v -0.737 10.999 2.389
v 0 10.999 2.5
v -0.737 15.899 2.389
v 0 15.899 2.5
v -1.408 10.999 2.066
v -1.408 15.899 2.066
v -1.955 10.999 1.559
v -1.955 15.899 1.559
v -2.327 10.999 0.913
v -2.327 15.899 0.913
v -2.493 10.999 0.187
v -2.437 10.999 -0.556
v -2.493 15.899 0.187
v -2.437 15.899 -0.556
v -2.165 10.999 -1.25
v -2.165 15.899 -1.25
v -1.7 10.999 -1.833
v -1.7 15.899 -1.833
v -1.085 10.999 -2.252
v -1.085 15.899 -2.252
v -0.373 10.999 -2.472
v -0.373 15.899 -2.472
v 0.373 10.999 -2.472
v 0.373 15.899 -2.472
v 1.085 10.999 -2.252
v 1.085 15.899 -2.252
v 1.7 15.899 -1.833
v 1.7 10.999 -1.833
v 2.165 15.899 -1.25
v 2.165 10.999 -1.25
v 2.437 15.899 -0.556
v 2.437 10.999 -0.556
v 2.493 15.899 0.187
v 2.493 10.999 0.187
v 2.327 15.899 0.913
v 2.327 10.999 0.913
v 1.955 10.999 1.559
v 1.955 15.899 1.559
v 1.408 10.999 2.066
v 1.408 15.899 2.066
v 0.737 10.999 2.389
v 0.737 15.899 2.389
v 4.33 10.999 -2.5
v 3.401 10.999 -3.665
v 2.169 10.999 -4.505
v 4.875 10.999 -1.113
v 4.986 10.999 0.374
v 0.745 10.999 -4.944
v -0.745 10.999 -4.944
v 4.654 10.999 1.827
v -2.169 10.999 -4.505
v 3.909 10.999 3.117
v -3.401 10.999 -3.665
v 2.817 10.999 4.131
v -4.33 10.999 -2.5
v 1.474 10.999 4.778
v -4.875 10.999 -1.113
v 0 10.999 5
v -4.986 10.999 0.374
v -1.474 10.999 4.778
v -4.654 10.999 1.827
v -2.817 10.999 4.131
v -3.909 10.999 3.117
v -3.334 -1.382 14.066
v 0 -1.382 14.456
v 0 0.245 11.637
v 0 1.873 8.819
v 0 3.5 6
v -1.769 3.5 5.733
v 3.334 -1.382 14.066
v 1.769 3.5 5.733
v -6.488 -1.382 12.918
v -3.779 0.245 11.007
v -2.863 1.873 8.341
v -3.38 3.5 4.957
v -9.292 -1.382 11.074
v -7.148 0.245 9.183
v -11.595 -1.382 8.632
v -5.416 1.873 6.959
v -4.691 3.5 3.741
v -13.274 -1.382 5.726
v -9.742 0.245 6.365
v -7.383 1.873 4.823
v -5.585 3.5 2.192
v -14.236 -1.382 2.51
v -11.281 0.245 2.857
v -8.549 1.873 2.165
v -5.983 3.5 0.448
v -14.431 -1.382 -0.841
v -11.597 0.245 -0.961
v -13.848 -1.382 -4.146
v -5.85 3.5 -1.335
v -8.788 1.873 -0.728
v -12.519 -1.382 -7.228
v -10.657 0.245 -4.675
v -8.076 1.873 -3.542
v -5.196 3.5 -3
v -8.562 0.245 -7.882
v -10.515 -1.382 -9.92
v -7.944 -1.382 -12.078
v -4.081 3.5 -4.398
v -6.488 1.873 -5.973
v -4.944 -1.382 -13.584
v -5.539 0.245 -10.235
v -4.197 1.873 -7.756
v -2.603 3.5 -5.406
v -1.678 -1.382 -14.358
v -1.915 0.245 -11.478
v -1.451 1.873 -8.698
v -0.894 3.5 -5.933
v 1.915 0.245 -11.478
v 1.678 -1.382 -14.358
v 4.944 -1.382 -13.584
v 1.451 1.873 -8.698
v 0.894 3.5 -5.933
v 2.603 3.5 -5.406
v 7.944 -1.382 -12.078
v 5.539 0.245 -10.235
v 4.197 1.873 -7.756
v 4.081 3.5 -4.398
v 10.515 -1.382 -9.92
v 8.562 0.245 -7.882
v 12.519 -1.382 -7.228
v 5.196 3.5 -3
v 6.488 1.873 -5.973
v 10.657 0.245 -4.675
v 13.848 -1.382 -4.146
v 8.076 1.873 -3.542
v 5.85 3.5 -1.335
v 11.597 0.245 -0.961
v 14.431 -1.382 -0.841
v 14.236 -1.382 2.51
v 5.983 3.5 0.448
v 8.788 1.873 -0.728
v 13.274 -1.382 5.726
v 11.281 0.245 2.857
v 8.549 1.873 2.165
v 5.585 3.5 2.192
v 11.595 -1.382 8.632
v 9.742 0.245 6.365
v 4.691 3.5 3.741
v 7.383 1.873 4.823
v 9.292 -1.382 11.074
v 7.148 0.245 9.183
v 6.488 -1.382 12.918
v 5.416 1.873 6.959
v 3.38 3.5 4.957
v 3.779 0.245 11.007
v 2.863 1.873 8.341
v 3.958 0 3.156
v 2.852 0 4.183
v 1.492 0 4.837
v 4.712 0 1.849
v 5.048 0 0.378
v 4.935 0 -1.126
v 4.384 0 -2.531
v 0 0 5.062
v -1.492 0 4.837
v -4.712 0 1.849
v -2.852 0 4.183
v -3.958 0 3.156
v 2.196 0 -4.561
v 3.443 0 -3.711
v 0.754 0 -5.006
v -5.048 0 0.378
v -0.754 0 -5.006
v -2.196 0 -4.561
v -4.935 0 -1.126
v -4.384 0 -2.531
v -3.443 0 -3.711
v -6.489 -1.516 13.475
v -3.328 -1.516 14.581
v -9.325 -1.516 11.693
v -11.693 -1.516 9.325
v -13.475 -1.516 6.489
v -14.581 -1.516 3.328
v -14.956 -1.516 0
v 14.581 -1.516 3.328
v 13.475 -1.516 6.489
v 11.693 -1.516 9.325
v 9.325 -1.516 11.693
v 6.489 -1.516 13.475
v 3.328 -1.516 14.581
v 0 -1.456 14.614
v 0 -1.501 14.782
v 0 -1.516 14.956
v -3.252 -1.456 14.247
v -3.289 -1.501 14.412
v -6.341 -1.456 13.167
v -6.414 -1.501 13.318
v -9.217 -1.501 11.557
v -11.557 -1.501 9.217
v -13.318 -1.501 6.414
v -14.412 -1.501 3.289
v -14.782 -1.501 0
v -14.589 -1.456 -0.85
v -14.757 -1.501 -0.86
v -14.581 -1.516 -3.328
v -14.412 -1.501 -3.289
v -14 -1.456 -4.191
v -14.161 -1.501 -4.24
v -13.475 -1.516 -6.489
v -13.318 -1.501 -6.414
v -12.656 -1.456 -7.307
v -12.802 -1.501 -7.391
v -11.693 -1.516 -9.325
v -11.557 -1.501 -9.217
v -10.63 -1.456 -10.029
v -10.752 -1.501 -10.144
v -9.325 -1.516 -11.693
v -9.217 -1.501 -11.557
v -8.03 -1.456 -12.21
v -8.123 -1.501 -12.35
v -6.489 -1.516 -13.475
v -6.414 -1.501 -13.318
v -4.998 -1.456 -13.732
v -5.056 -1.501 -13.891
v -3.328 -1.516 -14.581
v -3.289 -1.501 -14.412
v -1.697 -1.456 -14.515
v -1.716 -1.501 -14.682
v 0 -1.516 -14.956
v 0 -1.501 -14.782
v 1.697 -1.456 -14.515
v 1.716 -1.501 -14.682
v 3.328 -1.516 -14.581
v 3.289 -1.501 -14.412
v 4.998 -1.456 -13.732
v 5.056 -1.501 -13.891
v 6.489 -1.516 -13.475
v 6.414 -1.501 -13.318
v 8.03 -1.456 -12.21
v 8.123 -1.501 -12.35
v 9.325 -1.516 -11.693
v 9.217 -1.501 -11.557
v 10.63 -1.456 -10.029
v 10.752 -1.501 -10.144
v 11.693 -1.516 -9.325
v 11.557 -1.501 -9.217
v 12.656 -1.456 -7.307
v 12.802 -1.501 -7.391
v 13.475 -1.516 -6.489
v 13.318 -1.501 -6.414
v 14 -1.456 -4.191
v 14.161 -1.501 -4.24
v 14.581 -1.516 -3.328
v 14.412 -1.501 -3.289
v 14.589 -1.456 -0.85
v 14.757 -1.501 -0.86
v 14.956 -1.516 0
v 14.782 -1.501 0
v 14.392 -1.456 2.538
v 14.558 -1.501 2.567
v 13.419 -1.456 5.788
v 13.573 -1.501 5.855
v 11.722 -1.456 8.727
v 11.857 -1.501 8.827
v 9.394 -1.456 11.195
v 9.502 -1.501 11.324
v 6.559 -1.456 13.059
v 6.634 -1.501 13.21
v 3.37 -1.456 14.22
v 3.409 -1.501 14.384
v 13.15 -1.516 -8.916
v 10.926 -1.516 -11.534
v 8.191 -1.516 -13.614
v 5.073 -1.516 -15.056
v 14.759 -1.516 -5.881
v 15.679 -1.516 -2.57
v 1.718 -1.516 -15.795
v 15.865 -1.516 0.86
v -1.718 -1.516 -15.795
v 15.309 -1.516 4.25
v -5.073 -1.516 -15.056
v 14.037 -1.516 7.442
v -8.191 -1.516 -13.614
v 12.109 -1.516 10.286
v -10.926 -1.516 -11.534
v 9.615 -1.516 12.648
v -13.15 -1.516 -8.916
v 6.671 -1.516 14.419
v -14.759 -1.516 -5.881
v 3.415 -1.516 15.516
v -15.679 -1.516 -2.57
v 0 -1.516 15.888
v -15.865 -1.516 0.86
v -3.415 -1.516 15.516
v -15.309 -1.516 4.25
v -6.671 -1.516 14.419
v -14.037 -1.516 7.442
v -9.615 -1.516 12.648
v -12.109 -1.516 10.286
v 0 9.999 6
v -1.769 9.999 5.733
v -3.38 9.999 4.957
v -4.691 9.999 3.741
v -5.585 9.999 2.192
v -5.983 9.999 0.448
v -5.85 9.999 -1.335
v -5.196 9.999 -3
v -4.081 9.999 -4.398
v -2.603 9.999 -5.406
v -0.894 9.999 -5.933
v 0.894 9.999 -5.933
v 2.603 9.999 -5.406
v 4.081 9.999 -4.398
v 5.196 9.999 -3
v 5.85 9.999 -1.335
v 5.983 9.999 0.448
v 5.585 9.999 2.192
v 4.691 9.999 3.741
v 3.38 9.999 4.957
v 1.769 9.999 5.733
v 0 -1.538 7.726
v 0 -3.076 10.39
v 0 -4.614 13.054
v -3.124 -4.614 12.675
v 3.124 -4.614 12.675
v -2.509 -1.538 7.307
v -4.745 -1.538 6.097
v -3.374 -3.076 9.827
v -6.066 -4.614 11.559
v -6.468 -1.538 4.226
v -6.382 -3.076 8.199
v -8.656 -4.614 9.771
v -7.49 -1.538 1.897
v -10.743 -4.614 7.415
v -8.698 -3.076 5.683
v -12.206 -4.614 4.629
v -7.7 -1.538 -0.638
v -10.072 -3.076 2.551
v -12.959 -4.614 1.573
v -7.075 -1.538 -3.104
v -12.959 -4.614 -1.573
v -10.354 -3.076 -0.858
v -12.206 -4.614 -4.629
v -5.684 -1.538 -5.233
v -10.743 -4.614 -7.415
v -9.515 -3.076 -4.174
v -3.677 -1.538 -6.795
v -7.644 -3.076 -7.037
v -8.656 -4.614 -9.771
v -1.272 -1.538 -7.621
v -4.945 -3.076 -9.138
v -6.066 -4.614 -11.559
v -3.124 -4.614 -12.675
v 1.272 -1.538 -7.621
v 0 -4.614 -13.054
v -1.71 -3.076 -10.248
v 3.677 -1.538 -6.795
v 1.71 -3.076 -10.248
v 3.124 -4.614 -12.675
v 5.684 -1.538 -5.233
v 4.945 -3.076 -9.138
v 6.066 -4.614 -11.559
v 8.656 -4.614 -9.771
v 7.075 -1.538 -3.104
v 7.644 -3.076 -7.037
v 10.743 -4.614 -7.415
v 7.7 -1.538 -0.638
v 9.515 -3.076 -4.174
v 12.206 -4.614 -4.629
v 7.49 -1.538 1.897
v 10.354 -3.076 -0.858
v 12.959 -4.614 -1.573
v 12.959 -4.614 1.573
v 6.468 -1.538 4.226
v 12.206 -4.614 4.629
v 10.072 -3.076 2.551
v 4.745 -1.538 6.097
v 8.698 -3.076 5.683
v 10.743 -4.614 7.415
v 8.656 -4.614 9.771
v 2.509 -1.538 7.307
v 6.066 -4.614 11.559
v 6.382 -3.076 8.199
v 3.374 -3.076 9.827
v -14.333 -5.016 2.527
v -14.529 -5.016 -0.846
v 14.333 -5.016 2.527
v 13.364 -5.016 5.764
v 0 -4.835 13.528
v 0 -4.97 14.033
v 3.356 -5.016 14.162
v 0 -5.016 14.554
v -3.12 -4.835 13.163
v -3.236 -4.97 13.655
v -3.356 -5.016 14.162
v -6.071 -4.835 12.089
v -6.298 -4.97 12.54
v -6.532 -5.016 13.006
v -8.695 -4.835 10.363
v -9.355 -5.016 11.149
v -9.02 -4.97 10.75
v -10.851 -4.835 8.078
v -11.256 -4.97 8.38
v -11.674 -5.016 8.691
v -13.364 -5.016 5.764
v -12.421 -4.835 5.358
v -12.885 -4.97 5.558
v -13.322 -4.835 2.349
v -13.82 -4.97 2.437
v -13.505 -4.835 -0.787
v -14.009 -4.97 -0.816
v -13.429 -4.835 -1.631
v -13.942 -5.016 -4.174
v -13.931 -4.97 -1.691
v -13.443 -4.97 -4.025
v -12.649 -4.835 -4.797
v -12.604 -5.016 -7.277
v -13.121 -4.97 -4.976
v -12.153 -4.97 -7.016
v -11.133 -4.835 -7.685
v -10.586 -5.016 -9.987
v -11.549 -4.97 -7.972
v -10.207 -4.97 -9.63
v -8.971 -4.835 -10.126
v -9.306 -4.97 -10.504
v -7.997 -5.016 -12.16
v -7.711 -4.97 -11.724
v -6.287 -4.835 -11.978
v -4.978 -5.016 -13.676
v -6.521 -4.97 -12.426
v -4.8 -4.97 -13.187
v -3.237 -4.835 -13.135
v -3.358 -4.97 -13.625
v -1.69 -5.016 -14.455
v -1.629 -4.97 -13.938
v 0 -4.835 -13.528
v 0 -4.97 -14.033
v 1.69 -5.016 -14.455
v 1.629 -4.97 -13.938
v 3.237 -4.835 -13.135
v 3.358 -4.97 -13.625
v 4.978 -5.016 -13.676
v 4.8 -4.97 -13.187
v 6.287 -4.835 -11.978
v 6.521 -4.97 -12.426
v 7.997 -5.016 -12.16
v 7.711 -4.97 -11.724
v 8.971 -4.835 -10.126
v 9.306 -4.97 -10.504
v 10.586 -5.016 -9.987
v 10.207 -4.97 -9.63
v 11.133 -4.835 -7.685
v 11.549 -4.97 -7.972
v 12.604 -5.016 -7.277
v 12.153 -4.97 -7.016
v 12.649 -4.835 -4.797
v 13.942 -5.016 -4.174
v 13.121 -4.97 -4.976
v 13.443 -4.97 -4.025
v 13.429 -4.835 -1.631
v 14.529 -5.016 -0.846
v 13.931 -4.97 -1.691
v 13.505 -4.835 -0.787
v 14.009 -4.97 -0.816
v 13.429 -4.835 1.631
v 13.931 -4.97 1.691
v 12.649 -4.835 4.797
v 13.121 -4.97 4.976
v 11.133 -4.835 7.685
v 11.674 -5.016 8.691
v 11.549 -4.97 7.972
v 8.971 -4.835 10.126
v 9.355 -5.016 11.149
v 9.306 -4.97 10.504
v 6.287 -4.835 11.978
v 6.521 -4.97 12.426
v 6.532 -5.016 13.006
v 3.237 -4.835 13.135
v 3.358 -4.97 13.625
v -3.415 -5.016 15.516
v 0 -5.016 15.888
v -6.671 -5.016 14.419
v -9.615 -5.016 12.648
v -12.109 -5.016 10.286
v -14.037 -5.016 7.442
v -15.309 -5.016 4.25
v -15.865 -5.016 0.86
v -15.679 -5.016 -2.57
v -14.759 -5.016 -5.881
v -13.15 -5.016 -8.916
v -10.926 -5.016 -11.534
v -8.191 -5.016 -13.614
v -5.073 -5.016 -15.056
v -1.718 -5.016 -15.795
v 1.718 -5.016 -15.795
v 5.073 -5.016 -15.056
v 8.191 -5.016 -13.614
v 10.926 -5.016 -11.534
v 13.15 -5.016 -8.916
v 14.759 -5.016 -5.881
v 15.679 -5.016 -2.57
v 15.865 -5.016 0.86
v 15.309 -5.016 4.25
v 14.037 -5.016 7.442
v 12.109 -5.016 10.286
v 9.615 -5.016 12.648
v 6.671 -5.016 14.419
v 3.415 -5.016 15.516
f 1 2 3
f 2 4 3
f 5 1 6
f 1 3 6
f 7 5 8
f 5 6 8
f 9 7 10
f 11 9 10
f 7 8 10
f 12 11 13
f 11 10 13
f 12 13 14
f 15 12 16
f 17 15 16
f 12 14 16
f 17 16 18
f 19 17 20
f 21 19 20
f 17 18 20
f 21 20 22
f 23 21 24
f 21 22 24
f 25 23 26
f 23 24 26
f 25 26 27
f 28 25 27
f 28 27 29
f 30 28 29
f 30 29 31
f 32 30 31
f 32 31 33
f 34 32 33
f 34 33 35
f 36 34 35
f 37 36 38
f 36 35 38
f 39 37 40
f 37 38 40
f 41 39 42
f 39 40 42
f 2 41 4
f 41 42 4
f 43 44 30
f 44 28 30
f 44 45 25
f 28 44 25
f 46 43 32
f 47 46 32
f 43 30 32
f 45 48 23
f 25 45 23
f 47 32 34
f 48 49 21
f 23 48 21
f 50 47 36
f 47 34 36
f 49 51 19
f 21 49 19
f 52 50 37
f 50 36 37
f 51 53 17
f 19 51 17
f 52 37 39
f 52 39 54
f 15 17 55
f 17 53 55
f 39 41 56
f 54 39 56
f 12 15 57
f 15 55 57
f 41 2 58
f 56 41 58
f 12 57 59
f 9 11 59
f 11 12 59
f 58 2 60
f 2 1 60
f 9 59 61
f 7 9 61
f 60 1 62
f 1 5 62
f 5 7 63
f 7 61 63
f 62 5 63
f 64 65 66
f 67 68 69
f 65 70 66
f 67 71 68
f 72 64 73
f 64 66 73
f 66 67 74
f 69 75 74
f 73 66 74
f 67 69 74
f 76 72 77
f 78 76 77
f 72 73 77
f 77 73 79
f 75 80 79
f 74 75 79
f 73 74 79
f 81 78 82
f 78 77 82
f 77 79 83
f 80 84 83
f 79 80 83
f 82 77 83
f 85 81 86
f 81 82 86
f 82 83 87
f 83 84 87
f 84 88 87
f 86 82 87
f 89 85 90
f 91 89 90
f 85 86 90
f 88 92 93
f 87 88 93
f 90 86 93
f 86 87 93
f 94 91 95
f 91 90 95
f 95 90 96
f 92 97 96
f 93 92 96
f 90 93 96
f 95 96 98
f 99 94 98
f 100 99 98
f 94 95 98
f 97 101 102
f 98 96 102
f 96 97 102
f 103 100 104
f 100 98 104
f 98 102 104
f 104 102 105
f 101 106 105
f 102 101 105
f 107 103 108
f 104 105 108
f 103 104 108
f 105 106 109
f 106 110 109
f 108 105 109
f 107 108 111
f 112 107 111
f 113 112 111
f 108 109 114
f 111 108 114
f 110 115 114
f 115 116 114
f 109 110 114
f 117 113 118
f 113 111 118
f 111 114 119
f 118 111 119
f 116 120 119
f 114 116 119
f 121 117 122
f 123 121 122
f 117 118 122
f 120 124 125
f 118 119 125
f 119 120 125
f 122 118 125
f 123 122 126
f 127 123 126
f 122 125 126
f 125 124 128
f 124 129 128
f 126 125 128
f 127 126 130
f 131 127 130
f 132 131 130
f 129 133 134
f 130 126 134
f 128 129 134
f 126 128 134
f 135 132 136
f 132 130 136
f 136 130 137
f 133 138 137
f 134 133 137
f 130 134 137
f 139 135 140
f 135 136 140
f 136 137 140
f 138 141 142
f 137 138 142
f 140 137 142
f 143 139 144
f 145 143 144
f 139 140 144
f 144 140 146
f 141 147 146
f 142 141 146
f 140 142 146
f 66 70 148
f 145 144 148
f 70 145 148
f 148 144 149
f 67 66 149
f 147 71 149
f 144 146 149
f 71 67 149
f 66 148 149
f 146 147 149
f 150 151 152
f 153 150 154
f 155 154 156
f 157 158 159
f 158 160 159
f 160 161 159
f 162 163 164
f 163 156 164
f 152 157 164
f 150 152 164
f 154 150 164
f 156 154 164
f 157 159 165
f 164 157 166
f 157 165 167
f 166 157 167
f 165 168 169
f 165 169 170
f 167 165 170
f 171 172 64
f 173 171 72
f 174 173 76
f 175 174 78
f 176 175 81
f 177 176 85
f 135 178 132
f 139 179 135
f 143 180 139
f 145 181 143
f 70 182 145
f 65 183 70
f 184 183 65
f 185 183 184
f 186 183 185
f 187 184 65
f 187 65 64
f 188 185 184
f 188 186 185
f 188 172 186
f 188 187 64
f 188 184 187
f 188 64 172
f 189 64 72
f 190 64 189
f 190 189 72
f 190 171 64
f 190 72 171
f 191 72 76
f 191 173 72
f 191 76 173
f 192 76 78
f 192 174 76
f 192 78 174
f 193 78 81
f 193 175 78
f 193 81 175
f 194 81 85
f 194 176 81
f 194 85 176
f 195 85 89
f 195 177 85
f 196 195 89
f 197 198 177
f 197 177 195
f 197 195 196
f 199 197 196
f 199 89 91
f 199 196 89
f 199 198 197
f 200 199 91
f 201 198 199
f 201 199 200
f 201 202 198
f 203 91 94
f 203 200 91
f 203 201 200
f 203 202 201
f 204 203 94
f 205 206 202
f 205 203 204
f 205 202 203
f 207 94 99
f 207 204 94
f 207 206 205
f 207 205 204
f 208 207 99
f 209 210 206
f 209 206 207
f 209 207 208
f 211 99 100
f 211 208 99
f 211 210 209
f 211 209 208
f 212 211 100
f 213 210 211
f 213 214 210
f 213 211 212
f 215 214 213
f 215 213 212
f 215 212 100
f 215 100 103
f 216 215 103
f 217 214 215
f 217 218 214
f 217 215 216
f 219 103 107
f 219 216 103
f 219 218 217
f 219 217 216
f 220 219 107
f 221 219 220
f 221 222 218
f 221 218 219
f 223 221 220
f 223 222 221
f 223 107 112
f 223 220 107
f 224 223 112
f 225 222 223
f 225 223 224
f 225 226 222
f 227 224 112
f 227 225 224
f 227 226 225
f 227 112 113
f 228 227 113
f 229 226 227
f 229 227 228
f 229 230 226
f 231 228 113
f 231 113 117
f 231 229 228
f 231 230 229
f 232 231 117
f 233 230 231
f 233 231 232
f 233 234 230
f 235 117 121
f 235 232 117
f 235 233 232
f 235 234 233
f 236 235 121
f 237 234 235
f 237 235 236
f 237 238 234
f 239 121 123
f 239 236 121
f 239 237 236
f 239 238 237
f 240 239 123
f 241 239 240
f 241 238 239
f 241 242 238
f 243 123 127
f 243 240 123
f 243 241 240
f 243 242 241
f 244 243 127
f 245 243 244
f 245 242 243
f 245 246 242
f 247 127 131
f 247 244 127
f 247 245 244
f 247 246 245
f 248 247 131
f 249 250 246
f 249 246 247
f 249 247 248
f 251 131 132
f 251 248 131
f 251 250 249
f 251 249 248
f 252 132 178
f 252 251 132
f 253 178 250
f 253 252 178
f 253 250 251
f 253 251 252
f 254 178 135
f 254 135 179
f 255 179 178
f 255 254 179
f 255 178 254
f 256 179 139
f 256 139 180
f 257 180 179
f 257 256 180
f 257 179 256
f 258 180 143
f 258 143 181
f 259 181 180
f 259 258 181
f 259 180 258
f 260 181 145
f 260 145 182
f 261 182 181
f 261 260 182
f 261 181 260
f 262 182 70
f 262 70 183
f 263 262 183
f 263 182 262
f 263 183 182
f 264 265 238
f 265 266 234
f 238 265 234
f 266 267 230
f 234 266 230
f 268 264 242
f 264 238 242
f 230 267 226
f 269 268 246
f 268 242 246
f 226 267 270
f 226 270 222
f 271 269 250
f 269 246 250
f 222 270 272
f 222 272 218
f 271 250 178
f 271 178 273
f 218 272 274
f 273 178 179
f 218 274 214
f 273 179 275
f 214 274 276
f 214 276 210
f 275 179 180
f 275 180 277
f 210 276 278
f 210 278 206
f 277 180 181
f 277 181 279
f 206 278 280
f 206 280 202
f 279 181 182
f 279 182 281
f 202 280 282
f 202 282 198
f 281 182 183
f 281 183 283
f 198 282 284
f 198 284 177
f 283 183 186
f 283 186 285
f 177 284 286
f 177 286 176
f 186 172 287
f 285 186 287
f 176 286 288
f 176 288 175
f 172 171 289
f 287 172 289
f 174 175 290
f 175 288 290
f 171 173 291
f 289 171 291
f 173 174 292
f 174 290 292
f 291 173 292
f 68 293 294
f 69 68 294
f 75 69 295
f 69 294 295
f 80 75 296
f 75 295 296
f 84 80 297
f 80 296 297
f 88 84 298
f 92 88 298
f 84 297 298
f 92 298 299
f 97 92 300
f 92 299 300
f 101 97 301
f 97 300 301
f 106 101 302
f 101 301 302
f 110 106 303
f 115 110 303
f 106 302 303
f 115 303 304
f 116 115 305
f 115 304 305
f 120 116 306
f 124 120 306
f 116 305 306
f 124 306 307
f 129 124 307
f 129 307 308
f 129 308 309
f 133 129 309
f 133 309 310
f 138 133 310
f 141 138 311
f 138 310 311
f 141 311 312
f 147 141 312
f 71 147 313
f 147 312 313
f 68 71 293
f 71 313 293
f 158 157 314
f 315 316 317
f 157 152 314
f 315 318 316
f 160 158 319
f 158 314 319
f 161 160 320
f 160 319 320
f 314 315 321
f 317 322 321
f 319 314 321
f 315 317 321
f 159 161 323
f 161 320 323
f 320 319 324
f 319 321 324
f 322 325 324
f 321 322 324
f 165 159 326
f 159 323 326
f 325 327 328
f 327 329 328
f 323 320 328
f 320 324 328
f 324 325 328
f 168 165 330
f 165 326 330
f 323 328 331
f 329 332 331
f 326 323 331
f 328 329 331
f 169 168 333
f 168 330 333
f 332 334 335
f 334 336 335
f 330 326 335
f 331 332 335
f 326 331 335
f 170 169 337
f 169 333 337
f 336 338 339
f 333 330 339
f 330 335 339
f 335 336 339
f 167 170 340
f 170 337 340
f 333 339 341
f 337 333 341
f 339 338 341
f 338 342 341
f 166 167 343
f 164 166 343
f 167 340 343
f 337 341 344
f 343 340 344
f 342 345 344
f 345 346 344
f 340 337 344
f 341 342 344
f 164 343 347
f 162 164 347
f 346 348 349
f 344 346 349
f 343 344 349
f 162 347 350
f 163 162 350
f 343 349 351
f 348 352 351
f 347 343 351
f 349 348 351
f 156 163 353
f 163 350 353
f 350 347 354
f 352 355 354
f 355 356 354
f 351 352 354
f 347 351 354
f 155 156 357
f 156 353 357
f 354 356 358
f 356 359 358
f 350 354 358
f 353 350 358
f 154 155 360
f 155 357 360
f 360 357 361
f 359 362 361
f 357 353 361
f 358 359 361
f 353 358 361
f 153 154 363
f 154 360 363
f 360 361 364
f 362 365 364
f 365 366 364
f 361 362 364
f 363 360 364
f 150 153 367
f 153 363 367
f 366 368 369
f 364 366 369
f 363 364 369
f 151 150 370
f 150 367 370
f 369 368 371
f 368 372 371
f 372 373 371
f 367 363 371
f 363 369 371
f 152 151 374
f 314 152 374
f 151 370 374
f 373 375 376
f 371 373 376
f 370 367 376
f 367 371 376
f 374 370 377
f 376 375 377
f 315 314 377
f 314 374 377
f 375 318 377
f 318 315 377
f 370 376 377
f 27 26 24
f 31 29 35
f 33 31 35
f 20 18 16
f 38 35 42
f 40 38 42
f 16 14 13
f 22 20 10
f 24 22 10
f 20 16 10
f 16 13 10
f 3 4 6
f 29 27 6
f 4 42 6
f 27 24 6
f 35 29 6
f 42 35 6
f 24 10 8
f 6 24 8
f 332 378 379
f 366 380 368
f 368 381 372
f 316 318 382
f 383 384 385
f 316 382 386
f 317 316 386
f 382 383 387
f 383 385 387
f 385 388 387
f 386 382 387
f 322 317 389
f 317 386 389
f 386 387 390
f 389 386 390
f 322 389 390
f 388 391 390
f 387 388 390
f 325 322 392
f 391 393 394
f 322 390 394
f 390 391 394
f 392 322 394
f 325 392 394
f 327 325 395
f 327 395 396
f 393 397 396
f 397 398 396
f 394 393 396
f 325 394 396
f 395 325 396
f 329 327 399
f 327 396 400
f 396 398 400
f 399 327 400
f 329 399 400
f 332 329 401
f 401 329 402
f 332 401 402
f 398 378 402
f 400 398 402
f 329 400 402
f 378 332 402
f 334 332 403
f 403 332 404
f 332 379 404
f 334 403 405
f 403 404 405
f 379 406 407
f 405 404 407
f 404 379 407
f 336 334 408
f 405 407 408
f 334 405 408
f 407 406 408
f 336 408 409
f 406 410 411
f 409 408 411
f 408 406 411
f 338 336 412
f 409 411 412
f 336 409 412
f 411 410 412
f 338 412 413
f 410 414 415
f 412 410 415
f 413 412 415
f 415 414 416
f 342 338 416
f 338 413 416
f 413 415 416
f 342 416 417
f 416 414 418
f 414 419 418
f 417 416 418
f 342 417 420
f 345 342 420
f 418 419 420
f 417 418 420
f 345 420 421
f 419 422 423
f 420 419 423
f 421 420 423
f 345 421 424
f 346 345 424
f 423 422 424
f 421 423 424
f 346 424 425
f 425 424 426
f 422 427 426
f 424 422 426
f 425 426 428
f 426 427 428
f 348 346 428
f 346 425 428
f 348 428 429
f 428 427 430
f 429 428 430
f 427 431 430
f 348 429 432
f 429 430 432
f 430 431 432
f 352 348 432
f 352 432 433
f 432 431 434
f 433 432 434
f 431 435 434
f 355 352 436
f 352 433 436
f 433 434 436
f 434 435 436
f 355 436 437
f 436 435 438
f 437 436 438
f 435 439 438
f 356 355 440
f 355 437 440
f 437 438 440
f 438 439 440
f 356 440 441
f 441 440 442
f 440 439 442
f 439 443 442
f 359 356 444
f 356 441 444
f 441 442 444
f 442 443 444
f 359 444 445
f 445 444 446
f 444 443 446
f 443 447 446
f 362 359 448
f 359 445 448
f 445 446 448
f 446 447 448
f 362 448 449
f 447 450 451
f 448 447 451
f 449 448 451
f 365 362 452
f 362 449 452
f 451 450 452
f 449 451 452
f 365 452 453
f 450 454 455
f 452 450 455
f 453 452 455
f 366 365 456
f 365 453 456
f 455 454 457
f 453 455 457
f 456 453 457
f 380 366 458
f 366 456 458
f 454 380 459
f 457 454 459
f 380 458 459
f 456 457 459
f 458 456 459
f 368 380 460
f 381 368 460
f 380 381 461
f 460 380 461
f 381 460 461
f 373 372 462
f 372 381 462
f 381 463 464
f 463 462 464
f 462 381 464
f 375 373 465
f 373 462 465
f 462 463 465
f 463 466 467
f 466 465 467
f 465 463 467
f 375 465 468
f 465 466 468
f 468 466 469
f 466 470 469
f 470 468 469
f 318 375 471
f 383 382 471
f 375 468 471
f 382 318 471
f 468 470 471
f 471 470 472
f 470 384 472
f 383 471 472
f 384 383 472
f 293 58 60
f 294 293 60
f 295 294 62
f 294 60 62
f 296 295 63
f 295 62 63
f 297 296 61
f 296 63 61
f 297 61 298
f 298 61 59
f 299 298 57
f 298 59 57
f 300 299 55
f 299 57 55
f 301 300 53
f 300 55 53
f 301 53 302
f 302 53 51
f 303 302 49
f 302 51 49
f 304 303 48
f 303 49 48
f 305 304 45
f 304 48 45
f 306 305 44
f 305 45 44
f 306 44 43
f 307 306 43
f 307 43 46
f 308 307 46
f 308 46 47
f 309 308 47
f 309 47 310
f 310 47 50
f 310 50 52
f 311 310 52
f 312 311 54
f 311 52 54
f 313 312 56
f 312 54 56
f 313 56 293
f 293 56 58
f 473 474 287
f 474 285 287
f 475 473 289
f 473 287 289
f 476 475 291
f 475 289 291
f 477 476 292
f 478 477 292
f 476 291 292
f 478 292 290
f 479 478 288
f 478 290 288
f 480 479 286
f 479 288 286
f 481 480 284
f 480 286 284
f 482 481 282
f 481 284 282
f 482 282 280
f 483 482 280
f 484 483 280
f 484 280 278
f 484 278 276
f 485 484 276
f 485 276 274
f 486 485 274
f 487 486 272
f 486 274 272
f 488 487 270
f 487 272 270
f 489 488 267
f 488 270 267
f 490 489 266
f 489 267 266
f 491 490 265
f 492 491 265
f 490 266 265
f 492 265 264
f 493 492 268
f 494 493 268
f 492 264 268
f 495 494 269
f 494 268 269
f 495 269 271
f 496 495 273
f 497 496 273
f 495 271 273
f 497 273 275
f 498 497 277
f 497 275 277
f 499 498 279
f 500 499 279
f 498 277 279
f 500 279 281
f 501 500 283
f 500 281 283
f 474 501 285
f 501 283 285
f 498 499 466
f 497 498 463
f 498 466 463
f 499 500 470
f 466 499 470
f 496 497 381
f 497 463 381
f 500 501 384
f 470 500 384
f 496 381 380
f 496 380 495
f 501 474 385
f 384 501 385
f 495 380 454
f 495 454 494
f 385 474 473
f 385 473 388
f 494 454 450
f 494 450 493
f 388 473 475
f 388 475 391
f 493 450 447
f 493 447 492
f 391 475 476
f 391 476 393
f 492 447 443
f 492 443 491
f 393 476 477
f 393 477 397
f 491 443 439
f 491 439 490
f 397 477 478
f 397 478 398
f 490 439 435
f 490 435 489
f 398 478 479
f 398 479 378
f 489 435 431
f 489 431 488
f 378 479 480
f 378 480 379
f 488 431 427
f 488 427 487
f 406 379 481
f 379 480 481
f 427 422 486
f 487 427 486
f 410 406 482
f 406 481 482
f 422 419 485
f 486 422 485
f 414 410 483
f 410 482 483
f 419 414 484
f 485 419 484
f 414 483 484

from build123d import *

# Parameters (mm, degrees)
FILLET1_R     = 3
CHAMFER1_SIZE = 1
FILLET2_R     = 1


with BuildPart() as part:
    # Sketch1 → Revolve1 (revolve)
    with BuildSketch(Plane.XY, mode=Mode.PRIVATE) as revolve1_sk:
        Polygon((6, 10.999045222), (2.5, 10.999045222), (2.5, 15.899045222), (0, 15.899045222), (0, 3.5), (0, 0), (5.062177826, 0), (13.75, -5.015916471), (15.887822174, -5.015916471), (15.887822174, -1.515916471), (14.687822174, -1.515916471), (6, 3.5), align=None)
    revolve(revolve1_sk.sketch.rotate(Axis((0, 31.975823544, 0), (0, -1, 0)), 90), axis=Axis((0, 31.975823544, 0), (0, -1, 0)))

    # Fillet1
    fillet1_edges = [part.edges().sort_by_distance(p)[0] for p in [
        (0, -5.015916471, -13.75),
    ]]
    fillet(fillet1_edges, radius=FILLET1_R)

    # Chamfer1
    chamfer1_edges = [part.edges().sort_by_distance(p)[0] for p in [
        (0, 10.999045222, -6),
    ]]
    chamfer(chamfer1_edges, length=CHAMFER1_SIZE)

    # Fillet2
    fillet2_edges = [part.edges().sort_by_distance(p)[0] for p in [
        (0, -1.515916471, -14.687822174),
    ]]
    fillet(fillet2_edges, radius=FILLET2_R)


solid = part.part
